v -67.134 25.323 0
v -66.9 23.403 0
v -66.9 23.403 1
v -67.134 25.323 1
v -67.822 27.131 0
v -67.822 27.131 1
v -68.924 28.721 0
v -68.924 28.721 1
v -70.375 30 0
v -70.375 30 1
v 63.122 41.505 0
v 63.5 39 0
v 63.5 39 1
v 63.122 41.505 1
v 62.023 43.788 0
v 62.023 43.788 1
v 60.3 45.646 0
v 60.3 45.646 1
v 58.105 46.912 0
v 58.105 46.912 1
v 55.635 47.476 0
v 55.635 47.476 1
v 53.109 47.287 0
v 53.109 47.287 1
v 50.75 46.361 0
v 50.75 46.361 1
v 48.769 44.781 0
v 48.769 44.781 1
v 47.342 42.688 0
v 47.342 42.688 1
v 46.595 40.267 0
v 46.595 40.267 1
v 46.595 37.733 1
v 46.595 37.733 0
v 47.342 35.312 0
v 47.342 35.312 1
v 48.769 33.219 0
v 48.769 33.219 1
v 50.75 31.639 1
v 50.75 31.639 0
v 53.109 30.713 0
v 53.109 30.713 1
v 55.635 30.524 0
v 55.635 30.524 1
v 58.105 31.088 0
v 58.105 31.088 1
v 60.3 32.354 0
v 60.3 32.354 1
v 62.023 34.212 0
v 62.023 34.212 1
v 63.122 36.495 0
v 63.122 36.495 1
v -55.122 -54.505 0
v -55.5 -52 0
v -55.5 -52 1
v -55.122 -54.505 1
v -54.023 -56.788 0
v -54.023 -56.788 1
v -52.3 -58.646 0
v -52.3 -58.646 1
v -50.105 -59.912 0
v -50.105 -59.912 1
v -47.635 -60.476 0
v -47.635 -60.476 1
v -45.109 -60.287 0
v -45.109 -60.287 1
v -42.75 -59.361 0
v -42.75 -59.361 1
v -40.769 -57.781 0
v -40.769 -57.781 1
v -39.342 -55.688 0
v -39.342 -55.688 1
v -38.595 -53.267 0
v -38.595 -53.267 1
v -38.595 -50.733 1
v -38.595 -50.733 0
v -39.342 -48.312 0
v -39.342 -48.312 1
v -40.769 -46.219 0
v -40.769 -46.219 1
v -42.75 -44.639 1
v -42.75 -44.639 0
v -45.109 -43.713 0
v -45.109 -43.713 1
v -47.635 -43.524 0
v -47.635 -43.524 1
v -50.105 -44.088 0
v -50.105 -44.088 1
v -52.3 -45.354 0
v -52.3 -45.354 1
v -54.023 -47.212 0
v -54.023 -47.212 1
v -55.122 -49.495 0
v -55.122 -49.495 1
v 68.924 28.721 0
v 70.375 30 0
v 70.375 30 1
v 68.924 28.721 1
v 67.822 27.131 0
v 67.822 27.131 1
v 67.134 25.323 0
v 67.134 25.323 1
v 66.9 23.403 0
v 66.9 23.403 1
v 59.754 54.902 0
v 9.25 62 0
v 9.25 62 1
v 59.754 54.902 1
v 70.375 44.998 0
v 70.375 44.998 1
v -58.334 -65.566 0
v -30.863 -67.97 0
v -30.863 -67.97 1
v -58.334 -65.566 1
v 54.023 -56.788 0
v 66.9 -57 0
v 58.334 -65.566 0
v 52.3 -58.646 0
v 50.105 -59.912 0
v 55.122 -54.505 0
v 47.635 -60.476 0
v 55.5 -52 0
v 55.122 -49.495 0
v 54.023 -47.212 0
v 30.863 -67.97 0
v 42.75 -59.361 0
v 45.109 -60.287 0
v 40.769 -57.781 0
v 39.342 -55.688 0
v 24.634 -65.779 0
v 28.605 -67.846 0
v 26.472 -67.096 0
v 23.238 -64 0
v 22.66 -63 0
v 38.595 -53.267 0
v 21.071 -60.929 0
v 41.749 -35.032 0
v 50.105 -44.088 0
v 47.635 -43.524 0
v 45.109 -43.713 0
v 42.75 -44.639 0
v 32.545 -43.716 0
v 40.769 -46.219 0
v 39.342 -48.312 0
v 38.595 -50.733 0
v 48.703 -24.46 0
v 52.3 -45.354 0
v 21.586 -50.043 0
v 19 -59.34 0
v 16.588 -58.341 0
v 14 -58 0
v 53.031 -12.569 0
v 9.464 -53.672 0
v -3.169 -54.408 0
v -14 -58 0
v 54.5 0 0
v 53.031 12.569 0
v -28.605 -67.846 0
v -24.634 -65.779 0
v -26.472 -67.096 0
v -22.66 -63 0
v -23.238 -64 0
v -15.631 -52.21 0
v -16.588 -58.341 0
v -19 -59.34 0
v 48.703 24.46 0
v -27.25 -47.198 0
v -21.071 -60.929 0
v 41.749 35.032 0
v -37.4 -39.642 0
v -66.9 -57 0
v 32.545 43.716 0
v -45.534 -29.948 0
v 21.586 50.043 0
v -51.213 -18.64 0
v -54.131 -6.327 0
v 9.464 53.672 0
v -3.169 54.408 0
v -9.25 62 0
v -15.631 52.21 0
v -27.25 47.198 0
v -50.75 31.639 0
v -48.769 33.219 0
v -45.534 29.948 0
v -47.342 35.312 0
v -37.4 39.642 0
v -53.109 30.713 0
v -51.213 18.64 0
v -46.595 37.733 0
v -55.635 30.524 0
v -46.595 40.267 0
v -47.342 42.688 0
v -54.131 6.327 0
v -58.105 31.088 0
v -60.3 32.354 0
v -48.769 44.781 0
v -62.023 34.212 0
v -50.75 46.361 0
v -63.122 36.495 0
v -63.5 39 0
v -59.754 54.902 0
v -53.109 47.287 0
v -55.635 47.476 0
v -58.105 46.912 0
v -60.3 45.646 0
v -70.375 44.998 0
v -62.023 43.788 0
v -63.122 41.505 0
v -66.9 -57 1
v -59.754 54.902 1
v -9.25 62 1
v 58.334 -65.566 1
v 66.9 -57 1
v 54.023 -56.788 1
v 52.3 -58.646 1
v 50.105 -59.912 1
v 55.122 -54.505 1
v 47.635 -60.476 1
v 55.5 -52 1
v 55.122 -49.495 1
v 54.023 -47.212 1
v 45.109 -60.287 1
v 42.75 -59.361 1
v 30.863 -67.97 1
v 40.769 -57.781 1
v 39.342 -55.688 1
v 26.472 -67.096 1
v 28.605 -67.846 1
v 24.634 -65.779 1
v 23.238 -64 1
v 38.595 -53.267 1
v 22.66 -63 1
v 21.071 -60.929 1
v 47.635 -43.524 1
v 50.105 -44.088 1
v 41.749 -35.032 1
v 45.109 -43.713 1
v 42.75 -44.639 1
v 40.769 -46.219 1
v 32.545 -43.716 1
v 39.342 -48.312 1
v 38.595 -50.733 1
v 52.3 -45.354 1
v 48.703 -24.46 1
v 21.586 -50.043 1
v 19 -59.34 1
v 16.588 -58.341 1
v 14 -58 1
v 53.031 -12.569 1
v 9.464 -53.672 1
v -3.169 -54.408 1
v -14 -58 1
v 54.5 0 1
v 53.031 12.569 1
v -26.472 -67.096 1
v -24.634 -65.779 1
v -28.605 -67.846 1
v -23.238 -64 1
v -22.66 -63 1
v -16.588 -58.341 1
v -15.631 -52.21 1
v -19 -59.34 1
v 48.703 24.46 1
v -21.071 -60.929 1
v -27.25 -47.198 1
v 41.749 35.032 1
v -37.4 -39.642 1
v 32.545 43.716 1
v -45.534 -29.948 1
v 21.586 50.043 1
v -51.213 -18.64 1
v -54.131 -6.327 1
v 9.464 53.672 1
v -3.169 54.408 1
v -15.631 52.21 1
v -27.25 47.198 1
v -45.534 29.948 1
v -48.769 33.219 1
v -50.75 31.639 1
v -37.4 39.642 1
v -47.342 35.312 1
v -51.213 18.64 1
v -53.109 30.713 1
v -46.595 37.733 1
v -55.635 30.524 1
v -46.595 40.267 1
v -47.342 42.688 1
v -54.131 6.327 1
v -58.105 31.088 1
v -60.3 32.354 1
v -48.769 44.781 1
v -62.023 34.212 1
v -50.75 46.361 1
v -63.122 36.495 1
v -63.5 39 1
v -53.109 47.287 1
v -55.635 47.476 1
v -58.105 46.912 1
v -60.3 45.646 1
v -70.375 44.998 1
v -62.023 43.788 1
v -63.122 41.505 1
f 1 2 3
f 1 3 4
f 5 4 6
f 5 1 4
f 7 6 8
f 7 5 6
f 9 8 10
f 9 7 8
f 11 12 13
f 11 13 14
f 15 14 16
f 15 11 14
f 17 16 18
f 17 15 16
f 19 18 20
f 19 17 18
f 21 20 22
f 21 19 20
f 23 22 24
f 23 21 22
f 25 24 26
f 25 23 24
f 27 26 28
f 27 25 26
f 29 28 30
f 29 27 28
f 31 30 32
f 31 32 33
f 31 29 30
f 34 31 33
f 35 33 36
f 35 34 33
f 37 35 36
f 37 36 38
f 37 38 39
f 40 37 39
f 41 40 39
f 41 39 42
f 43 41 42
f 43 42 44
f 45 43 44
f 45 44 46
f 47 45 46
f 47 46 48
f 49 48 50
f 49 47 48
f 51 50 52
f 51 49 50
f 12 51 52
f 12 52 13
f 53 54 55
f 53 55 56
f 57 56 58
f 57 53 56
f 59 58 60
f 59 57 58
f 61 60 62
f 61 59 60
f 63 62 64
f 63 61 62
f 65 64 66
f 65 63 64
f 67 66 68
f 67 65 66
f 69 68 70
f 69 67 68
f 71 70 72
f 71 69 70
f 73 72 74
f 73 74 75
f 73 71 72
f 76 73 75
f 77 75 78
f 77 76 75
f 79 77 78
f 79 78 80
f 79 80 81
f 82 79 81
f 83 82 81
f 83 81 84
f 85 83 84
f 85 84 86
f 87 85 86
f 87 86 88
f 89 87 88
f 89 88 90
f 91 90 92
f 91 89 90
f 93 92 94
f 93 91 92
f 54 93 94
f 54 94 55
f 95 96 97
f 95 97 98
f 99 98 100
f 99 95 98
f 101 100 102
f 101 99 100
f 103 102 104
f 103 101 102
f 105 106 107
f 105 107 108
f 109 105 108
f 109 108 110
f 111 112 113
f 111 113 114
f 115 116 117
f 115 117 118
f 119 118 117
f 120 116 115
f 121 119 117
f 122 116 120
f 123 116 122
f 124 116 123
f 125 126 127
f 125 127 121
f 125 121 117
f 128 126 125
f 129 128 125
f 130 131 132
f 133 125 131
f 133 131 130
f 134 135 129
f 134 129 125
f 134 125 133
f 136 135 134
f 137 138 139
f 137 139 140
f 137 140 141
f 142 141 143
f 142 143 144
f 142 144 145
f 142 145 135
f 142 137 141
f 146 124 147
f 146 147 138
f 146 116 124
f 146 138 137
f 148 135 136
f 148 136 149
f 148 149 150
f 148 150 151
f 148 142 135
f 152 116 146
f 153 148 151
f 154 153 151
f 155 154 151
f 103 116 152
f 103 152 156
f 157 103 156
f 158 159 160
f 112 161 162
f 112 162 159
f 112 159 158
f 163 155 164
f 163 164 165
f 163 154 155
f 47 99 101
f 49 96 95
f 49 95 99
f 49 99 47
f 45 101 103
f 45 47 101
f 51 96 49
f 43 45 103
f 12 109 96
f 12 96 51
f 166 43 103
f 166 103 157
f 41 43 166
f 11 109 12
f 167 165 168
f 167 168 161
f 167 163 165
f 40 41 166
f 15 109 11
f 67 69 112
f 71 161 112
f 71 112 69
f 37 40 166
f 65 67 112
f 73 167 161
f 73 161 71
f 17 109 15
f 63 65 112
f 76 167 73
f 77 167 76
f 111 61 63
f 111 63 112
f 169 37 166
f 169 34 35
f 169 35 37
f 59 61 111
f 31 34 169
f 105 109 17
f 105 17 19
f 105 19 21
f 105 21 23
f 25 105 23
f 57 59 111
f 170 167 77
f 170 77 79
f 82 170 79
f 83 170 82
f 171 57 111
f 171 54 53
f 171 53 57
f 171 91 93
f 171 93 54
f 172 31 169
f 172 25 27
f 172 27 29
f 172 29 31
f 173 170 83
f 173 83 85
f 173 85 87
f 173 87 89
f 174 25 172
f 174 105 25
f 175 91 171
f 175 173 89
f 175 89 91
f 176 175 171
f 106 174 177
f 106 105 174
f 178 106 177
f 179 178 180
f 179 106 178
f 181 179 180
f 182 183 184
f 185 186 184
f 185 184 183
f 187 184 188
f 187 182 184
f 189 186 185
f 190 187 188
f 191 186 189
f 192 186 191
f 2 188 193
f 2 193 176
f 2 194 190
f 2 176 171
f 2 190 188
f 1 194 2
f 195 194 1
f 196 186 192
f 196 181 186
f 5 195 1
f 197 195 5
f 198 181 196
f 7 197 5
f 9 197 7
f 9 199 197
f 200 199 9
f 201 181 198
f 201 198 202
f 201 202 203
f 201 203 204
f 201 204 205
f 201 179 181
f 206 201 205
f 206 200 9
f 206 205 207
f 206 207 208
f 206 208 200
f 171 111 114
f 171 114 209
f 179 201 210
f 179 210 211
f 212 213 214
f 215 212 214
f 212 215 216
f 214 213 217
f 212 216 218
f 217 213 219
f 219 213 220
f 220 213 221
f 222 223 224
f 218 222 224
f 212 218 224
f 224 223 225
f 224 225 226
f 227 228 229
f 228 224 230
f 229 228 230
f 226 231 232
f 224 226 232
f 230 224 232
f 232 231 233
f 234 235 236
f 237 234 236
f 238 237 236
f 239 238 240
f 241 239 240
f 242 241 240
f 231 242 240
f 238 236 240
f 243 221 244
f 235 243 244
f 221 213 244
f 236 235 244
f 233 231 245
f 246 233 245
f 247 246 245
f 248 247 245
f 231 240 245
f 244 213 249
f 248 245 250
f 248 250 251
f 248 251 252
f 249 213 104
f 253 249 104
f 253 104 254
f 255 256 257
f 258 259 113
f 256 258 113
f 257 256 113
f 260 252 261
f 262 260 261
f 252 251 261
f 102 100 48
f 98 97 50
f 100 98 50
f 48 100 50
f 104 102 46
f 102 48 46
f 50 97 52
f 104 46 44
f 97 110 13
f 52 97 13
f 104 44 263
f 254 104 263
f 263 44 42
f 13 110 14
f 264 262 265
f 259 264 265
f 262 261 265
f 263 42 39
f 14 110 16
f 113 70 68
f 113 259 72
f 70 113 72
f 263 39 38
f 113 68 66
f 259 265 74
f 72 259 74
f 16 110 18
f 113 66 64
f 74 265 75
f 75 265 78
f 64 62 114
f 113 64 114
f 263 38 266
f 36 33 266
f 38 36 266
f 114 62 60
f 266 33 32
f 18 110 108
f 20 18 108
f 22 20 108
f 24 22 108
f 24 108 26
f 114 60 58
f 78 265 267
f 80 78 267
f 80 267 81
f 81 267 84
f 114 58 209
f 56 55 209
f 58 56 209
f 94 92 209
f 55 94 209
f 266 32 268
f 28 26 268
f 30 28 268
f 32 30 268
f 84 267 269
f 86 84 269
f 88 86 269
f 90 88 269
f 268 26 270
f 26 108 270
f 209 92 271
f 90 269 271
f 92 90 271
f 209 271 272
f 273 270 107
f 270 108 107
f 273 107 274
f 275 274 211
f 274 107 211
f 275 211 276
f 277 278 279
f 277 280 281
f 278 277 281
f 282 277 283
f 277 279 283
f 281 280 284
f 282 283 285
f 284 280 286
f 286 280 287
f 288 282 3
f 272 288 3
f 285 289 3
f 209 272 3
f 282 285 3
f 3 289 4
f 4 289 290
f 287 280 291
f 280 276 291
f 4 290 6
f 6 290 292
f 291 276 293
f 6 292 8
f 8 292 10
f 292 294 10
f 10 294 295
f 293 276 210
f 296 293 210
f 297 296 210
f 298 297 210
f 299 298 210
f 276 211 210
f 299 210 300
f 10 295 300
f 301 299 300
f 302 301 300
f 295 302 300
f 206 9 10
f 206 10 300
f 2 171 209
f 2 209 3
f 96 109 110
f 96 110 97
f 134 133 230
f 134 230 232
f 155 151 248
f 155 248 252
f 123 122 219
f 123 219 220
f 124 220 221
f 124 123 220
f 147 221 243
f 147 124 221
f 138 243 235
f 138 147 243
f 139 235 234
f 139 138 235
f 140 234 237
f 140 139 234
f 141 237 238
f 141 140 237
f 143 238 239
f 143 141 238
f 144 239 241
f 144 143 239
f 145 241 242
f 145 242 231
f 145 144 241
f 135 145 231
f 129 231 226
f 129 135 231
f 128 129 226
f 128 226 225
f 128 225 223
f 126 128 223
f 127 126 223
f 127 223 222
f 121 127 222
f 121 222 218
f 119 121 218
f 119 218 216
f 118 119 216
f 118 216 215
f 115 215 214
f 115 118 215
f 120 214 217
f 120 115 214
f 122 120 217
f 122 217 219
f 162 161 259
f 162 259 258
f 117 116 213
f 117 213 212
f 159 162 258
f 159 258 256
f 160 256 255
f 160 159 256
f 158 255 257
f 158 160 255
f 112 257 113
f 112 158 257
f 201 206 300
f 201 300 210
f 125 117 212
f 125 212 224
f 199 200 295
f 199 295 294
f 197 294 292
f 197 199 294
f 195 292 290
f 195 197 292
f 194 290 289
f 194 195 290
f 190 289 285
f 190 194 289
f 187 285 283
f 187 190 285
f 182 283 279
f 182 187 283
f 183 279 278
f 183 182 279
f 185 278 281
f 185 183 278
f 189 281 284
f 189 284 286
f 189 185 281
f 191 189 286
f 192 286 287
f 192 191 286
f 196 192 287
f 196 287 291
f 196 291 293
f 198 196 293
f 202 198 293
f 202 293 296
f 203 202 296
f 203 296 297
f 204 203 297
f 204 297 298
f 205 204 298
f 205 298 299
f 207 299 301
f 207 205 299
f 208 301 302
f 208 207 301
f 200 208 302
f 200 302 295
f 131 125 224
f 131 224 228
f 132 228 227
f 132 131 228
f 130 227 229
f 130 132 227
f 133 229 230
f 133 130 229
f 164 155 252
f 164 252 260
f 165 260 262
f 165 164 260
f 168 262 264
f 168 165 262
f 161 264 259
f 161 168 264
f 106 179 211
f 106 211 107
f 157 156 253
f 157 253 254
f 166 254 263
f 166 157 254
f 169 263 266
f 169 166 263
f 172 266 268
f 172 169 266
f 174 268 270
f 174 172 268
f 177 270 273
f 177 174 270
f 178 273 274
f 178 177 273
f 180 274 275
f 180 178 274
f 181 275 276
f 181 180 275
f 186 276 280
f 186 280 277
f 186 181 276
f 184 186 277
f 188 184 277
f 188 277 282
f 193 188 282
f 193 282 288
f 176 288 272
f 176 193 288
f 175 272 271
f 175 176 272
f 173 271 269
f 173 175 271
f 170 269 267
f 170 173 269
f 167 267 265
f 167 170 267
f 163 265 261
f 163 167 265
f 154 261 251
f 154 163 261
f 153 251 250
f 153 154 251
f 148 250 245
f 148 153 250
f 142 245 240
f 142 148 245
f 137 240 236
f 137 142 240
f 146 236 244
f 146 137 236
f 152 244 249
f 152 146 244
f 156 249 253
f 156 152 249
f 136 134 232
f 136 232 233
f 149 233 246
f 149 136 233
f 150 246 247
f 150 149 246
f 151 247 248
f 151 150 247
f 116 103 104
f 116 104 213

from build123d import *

# Parameters (mm, degrees)
SKETCH1_R           = 54.5
SKETCH1_R_2         = 8.5
BOSS_EXTRUDE1_DEPTH = 1


with BuildPart() as part:
    # Sketch1 → Boss-Extrude1 (new body)
    with BuildSketch(Plane.XY):
        with BuildLine():
            Line((-9.25, 62), (9.25, 62))
            Line((9.25, 62), (59.753671506, 54.902171851))
            Line((59.753671506, 54.902171851), (70.375, 44.997622795))
            Line((70.375, 44.997622795), (70.375, 30))
            ThreePointArc((70.375, 30), (67.821864652, 27.130969792), (66.9, 23.402699416))
            Line((66.9, 23.402699416), (66.9, -57))
            Line((66.9, -57), (58.333823358, -65.566176642))
            Line((58.333823358, -65.566176642), (30.863053479, -67.969557585))
            ThreePointArc((30.863053479, -67.969557585), (26.471818631, -67.096086665), (23.237604307, -64))
            Line((23.237604307, -64), (22.660254038, -63))
            ThreePointArc((22.660254038, -63), (19, -59.339745962), (14, -58))
            Line((14, -58), (-14, -58))
            ThreePointArc((-14, -58), (-19, -59.339745962), (-22.660254038, -63))
            Line((-22.660254038, -63), (-23.237604307, -64))
            ThreePointArc((-23.237604307, -64), (-26.471818631, -67.096086665), (-30.863053479, -67.969557585))
            Line((-30.863053479, -67.969557585), (-58.333823358, -65.566176642))
            Line((-58.333823358, -65.566176642), (-66.9, -57))
            Line((-66.9, -57), (-66.9, 23.402699416))
            ThreePointArc((-66.9, 23.402699416), (-67.821864652, 27.130969792), (-70.375, 30))
            Line((-70.375, 30), (-70.375, 44.997622795))
            Line((-70.375, 44.997622795), (-59.753671506, 54.902171851))
            Line((-59.753671506, 54.902171851), (-9.25, 62))
        make_face()
        Circle(SKETCH1_R, mode=Mode.SUBTRACT)
        with Locations((55, 39)):
            Circle(SKETCH1_R_2, mode=Mode.SUBTRACT)
        with Locations(Location((-55, 39, 0), (0, 0, 180))):
            Circle(SKETCH1_R_2, mode=Mode.SUBTRACT)
        with Locations((47, -52)):
            Circle(SKETCH1_R_2, mode=Mode.SUBTRACT)
        with Locations(Location((-47, -52, 0), (0, 0, 180))):
            Circle(SKETCH1_R_2, mode=Mode.SUBTRACT)
    extrude(amount=BOSS_EXTRUDE1_DEPTH)


solid = part.part
